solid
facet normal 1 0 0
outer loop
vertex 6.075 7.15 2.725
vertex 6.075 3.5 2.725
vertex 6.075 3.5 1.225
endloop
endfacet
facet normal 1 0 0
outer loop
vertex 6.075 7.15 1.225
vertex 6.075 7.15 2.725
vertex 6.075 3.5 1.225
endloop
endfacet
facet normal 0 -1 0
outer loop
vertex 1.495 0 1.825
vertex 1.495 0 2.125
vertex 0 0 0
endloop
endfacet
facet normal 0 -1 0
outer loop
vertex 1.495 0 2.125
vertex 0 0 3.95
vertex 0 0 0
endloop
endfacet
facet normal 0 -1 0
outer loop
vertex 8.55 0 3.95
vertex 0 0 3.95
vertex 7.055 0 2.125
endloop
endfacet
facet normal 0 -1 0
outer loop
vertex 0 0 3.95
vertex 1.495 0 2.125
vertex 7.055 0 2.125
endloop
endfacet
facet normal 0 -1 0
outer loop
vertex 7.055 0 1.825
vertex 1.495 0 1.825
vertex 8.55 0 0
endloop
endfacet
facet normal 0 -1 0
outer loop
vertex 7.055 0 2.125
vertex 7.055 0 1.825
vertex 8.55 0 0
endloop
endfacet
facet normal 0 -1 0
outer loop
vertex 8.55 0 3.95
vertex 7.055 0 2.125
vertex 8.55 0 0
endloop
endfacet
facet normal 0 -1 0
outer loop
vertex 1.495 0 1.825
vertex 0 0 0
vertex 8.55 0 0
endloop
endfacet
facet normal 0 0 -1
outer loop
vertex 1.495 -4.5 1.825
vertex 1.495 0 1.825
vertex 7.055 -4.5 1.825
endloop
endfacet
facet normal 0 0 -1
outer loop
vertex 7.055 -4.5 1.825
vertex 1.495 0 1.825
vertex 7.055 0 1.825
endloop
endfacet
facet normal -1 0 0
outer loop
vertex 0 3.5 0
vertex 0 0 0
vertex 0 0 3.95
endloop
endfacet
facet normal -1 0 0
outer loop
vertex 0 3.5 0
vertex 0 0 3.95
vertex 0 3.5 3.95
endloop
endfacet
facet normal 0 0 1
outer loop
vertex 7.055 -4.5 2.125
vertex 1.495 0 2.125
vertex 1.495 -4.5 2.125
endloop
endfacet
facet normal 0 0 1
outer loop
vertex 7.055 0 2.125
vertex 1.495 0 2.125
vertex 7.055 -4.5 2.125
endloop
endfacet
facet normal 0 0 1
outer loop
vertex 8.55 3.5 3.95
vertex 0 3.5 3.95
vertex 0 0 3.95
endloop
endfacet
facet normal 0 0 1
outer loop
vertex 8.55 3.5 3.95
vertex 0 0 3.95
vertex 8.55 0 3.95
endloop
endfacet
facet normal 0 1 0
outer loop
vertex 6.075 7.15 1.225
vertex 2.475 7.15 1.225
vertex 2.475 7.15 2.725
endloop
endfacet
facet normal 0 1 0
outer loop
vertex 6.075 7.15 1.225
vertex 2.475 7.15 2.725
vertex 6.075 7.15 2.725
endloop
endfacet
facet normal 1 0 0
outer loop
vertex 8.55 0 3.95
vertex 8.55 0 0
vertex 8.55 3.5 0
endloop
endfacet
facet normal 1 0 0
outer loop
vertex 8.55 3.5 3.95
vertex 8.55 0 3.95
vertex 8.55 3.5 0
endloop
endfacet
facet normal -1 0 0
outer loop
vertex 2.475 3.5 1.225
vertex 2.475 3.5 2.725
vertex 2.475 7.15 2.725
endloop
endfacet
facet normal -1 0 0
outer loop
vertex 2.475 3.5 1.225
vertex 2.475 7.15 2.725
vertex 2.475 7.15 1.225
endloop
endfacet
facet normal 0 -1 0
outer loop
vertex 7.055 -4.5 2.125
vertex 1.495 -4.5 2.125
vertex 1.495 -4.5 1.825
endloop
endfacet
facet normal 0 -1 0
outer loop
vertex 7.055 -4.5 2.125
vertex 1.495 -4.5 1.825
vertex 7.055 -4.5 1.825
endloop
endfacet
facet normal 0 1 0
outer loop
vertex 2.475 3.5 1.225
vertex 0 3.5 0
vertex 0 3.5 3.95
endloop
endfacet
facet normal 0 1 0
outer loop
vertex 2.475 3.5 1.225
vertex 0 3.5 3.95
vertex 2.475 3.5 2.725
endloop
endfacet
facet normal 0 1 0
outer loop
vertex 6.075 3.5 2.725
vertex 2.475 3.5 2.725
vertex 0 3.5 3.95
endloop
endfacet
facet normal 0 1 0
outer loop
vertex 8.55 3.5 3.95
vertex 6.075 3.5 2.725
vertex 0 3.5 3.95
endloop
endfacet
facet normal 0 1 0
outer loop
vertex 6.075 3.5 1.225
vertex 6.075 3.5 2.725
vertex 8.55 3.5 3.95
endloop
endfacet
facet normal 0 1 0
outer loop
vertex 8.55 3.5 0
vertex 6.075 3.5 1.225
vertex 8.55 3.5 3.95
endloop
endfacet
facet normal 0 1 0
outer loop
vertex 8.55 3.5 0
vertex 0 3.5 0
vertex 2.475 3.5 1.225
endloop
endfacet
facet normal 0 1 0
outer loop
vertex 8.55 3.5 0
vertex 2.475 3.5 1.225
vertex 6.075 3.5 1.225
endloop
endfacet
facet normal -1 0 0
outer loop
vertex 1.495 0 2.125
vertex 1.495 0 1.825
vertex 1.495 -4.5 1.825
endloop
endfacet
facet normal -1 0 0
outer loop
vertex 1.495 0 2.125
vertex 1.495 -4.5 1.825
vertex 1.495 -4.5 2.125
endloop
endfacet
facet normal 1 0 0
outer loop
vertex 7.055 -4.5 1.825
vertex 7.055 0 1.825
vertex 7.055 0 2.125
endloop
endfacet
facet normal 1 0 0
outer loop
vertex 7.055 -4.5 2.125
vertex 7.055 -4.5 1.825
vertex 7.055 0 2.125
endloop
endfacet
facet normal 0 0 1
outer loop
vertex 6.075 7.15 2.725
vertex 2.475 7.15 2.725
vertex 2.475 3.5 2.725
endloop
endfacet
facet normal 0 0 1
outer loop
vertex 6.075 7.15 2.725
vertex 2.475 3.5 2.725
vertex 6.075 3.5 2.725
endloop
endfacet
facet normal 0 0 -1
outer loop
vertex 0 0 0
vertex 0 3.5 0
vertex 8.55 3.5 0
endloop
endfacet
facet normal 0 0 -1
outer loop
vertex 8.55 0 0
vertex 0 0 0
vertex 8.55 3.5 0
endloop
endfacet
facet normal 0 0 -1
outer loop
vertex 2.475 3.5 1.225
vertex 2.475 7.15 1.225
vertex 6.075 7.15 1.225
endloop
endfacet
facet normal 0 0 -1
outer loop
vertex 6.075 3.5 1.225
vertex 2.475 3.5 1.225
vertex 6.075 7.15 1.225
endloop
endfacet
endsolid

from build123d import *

# Parameters (mm, degrees)
SKETCH_1_W      = 8.55
SKETCH_1_H      = 3.5
EXTRUDE_1_DEPTH = 3.95
SKETCH_2_W      = 3.6
SKETCH_2_H      = 1.5
EXTRUDE_2_DEPTH = 3.65
SKETCH_3_W      = 5.56
SKETCH_3_H      = 0.3
EXTRUDE_3_DEPTH = 4.5


with BuildPart() as part:
    # 草图1 → 凸台-拉伸1 (new body)
    with BuildSketch(Plane.XY):
        with Locations((4.275, 1.75)):
            Rectangle(SKETCH_1_W, SKETCH_1_H)
    extrude(amount=EXTRUDE_1_DEPTH)

    # 草图2 → 凸台-拉伸2 (add)
    with BuildSketch(Plane(origin=(0, 3.5, 0), x_dir=(1, 0, 0), z_dir=(0, 1, 0))):
        with Locations((4.275, -1.975)):
            Rectangle(SKETCH_2_W, SKETCH_2_H)
    extrude(amount=EXTRUDE_2_DEPTH)

    # 草图3 → 凸台-拉伸3 (add)
    with BuildSketch(Plane.XZ):
        with Locations((4.275, 1.975)):
            Rectangle(SKETCH_3_W, SKETCH_3_H)
    extrude(amount=EXTRUDE_3_DEPTH)


solid = part.part
